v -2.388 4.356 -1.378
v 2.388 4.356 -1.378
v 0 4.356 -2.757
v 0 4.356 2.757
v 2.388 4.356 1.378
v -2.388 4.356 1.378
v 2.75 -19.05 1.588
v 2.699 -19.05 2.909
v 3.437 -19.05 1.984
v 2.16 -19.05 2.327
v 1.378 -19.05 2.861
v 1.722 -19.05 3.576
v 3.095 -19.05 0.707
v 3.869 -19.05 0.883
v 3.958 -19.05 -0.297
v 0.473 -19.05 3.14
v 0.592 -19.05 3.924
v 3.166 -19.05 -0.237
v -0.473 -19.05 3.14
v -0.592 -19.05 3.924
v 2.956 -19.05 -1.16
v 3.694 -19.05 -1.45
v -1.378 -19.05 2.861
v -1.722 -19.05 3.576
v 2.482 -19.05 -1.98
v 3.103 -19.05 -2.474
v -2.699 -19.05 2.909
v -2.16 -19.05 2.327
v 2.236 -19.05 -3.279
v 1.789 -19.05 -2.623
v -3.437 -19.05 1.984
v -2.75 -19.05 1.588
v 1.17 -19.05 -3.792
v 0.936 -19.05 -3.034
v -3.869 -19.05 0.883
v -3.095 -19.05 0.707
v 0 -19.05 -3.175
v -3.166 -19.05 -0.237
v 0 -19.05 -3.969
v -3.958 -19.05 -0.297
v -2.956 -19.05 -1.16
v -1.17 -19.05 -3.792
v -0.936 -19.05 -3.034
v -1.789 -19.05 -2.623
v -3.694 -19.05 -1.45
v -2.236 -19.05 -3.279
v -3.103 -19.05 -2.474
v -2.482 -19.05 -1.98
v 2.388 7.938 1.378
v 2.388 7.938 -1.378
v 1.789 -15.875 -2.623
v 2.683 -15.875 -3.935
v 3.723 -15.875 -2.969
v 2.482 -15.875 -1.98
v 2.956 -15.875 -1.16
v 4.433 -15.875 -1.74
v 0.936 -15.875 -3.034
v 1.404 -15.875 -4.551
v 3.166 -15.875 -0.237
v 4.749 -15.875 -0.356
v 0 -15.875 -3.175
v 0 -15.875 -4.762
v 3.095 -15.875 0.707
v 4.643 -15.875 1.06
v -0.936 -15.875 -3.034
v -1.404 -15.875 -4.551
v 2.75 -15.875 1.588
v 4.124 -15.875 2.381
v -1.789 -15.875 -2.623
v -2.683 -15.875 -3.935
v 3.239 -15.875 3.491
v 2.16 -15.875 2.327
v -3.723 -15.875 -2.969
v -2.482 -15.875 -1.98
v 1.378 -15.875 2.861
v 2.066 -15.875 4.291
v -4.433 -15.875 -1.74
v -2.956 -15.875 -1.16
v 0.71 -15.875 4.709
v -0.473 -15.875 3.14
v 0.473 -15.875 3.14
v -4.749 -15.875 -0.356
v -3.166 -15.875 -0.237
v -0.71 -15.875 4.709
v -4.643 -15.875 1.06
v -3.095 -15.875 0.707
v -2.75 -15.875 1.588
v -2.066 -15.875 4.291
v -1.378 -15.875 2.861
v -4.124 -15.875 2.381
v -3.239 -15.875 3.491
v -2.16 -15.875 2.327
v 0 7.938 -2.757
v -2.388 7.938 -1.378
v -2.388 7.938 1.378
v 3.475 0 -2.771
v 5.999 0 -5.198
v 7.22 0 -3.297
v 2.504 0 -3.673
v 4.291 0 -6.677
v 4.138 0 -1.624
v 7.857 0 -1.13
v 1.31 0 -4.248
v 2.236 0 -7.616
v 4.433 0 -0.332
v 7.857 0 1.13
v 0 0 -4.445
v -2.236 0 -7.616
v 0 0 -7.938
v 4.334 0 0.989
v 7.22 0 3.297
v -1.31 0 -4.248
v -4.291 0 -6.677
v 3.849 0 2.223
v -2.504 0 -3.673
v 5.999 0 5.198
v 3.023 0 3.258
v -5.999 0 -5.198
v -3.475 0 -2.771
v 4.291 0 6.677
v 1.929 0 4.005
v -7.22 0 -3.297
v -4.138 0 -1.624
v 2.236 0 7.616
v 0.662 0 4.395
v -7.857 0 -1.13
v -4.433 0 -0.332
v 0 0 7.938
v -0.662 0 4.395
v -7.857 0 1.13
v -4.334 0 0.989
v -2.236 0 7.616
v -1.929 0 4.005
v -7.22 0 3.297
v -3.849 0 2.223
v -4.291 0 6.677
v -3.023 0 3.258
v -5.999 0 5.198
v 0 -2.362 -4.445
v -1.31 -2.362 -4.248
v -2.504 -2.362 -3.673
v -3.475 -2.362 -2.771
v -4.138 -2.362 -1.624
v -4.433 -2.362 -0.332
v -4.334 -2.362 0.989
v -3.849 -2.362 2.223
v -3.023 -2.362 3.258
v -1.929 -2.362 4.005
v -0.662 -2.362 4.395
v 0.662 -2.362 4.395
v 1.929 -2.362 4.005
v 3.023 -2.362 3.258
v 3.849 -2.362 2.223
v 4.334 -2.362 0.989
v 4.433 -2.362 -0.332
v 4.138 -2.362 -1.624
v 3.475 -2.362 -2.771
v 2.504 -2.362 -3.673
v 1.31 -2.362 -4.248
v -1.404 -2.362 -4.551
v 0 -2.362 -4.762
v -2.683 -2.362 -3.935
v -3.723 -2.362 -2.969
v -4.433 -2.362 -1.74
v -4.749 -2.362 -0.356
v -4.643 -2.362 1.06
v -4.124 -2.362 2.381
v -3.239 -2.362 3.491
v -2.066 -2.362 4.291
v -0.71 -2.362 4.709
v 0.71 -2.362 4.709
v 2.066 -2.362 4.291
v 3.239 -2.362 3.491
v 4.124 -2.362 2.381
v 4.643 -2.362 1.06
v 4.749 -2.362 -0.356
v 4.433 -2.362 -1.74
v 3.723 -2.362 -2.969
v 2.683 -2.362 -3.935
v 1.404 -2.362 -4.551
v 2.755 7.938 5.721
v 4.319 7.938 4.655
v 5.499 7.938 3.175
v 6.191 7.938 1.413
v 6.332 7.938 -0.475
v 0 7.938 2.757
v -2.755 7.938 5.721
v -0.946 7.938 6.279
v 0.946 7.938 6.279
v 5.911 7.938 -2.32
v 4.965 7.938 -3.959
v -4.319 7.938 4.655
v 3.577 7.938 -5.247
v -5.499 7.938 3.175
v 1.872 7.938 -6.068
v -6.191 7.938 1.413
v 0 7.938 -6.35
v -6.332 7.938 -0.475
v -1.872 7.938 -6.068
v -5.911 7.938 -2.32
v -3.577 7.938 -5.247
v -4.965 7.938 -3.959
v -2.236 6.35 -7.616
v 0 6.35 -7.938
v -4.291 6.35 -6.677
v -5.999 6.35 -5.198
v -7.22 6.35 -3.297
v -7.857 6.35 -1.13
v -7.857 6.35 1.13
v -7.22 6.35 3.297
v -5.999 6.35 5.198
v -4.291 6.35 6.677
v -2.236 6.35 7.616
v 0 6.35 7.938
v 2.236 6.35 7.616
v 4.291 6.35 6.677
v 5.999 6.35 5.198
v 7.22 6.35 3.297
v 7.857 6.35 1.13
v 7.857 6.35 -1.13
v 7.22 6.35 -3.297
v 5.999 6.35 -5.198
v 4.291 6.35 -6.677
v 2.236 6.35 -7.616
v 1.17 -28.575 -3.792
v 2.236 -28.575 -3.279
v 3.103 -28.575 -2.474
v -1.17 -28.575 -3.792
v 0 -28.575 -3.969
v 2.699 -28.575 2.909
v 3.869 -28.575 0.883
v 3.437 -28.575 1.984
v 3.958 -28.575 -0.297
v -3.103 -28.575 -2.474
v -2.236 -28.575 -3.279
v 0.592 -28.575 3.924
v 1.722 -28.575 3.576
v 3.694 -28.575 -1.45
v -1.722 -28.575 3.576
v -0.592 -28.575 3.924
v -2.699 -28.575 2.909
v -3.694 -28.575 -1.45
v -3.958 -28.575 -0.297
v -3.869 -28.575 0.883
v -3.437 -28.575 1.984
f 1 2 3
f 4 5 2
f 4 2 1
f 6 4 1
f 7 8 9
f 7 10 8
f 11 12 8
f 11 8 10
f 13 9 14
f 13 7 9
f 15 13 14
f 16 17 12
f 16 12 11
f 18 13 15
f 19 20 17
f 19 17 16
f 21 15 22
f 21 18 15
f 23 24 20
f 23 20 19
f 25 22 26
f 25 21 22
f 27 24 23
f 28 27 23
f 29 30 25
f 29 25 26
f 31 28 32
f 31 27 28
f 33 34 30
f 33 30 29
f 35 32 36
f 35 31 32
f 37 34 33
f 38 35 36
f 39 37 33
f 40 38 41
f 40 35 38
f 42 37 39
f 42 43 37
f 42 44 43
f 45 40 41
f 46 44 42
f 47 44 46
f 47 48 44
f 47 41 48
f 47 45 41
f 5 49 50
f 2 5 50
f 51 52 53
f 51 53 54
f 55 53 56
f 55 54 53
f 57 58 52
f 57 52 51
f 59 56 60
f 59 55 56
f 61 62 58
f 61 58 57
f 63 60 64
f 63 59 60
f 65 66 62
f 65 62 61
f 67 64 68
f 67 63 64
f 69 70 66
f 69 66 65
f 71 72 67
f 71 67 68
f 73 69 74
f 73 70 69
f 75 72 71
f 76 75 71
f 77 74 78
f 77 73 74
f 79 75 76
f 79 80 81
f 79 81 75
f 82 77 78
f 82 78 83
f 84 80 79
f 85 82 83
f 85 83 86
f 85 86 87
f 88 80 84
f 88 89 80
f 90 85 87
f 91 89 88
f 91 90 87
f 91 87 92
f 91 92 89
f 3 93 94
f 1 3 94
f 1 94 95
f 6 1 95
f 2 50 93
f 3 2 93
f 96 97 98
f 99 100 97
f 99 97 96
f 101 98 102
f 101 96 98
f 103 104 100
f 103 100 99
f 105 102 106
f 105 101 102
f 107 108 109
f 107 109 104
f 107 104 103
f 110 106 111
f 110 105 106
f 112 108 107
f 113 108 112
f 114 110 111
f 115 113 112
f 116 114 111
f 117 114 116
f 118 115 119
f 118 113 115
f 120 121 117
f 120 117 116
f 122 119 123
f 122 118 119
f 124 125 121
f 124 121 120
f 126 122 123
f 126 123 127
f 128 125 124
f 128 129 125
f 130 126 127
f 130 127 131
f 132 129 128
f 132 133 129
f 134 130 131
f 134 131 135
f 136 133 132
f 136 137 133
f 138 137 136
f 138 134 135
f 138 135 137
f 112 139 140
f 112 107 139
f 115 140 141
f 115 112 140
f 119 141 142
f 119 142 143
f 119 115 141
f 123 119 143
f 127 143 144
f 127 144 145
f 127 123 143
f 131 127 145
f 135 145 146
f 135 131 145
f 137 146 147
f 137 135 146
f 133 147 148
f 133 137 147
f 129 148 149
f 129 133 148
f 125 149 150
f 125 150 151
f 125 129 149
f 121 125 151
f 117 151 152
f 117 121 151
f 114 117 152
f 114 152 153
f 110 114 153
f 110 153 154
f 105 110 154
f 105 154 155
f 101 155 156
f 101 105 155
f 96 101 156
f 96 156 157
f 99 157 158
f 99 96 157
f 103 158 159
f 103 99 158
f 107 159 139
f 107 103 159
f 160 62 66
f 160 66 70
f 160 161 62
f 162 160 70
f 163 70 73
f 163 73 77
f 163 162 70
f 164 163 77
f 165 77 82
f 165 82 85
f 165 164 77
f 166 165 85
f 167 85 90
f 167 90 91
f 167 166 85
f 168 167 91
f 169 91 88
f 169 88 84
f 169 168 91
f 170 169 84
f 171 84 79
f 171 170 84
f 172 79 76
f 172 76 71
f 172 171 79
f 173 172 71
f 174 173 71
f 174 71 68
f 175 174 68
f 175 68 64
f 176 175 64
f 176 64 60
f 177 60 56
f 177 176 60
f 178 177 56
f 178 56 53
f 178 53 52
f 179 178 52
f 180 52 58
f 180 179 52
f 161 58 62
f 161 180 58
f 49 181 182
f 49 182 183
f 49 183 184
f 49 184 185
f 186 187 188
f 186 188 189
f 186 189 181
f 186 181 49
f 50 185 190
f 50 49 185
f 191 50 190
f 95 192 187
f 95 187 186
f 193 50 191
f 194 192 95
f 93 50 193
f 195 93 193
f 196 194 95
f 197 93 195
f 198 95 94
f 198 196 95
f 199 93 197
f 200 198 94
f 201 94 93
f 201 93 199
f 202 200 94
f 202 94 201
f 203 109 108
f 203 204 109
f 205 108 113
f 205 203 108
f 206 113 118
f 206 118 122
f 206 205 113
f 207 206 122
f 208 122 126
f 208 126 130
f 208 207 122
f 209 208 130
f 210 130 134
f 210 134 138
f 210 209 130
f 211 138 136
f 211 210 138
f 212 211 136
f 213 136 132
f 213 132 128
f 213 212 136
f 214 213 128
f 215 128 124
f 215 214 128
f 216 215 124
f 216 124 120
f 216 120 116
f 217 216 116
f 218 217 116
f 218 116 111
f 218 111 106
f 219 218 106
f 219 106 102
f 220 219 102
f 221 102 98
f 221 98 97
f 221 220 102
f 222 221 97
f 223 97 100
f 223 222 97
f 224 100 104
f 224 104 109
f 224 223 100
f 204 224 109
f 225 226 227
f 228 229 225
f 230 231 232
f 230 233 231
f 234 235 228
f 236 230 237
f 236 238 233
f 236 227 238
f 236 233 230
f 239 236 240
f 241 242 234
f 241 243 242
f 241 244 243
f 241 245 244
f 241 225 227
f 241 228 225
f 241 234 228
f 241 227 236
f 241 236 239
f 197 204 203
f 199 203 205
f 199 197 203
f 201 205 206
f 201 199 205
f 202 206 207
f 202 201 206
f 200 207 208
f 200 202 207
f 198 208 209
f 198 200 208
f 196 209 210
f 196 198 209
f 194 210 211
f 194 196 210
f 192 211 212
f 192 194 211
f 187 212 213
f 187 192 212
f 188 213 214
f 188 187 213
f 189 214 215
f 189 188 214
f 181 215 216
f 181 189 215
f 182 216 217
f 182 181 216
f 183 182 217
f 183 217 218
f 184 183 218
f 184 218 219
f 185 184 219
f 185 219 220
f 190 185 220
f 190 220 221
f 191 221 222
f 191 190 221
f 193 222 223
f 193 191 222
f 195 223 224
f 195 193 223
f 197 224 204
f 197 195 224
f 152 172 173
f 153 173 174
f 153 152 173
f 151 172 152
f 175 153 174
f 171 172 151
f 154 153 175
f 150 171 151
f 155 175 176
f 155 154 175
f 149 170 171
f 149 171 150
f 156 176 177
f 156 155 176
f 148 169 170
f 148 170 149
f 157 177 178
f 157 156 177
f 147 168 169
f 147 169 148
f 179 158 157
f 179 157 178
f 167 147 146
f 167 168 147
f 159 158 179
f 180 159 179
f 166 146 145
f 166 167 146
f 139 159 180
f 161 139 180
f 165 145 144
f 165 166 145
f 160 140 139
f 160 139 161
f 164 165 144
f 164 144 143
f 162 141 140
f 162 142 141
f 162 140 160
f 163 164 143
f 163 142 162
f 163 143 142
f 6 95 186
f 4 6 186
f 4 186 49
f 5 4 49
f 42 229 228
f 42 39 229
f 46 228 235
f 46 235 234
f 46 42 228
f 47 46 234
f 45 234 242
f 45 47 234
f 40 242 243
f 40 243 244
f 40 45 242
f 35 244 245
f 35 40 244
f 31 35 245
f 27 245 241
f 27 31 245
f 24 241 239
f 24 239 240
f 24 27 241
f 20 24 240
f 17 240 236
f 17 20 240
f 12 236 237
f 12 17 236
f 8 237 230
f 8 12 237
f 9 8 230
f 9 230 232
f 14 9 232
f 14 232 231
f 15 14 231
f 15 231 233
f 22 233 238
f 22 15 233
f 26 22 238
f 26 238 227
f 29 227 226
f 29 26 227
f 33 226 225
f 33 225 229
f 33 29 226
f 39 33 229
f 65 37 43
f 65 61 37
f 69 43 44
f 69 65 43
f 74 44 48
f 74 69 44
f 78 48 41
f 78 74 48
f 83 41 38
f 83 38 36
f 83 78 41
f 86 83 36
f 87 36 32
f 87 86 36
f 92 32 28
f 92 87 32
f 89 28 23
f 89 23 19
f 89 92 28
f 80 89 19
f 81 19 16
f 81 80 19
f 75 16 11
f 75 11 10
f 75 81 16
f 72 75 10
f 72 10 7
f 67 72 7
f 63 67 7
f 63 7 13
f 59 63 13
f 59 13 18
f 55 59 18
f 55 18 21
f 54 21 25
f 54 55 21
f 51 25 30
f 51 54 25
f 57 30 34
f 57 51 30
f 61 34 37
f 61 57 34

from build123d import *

# Parameters (mm, degrees)
CUT_EXTRUDE1_DEPTH = 3.581396898


with BuildPart() as part:
    # Sketch2 → Base-Revolve (revolve)
    with BuildSketch(Plane.XY, mode=Mode.PRIVATE) as base_revolve_sk:
        Polygon((0, 0), (7.9375, 0), (7.9375, 6.35), (6.35, 7.9375), (0, 7.9375), align=None)
    revolve(base_revolve_sk.sketch.rotate(Axis((0, 0, 0), (0, 1, 0)), 90), axis=Axis((0, 0, 0), (0, 1, 0)))

    # Sketch3 → Boss-Revolve1 (revolve)
    with BuildSketch(Plane.XY, mode=Mode.PRIVATE) as boss_revolve1_sk:
        Polygon((0, -28.575), (3.96875, -28.575), (3.96875, -19.05), (3.175, -19.05), (3.175, -15.875), (4.7625, -15.875), (4.7625, -2.362197954), (4.445, -2.362197954), (4.445, 0), (0, 0), align=None)
    revolve(boss_revolve1_sk.sketch.rotate(Axis((0, 0, 0), (0, 1, 0)), 90), axis=Axis((0, 0, 0), (0, 1, 0)))

    # Sketch4 → Cut-Extrude1 (cut)
    with BuildSketch(Plane(origin=(0, 7.9375, 0), x_dir=(-1, 0, 0), z_dir=(0, 1, 0))):
        Polygon((2.387597932, 1.378480068), (6.25e-07, 2.756960497), (-2.387597307, 1.378481151), (-2.387598557, -1.378478985), (-1.876e-06, -2.756960497), (2.387596681, -1.378482234), align=None)
    extrude(amount=-CUT_EXTRUDE1_DEPTH, mode=Mode.SUBTRACT)


solid = part.part
